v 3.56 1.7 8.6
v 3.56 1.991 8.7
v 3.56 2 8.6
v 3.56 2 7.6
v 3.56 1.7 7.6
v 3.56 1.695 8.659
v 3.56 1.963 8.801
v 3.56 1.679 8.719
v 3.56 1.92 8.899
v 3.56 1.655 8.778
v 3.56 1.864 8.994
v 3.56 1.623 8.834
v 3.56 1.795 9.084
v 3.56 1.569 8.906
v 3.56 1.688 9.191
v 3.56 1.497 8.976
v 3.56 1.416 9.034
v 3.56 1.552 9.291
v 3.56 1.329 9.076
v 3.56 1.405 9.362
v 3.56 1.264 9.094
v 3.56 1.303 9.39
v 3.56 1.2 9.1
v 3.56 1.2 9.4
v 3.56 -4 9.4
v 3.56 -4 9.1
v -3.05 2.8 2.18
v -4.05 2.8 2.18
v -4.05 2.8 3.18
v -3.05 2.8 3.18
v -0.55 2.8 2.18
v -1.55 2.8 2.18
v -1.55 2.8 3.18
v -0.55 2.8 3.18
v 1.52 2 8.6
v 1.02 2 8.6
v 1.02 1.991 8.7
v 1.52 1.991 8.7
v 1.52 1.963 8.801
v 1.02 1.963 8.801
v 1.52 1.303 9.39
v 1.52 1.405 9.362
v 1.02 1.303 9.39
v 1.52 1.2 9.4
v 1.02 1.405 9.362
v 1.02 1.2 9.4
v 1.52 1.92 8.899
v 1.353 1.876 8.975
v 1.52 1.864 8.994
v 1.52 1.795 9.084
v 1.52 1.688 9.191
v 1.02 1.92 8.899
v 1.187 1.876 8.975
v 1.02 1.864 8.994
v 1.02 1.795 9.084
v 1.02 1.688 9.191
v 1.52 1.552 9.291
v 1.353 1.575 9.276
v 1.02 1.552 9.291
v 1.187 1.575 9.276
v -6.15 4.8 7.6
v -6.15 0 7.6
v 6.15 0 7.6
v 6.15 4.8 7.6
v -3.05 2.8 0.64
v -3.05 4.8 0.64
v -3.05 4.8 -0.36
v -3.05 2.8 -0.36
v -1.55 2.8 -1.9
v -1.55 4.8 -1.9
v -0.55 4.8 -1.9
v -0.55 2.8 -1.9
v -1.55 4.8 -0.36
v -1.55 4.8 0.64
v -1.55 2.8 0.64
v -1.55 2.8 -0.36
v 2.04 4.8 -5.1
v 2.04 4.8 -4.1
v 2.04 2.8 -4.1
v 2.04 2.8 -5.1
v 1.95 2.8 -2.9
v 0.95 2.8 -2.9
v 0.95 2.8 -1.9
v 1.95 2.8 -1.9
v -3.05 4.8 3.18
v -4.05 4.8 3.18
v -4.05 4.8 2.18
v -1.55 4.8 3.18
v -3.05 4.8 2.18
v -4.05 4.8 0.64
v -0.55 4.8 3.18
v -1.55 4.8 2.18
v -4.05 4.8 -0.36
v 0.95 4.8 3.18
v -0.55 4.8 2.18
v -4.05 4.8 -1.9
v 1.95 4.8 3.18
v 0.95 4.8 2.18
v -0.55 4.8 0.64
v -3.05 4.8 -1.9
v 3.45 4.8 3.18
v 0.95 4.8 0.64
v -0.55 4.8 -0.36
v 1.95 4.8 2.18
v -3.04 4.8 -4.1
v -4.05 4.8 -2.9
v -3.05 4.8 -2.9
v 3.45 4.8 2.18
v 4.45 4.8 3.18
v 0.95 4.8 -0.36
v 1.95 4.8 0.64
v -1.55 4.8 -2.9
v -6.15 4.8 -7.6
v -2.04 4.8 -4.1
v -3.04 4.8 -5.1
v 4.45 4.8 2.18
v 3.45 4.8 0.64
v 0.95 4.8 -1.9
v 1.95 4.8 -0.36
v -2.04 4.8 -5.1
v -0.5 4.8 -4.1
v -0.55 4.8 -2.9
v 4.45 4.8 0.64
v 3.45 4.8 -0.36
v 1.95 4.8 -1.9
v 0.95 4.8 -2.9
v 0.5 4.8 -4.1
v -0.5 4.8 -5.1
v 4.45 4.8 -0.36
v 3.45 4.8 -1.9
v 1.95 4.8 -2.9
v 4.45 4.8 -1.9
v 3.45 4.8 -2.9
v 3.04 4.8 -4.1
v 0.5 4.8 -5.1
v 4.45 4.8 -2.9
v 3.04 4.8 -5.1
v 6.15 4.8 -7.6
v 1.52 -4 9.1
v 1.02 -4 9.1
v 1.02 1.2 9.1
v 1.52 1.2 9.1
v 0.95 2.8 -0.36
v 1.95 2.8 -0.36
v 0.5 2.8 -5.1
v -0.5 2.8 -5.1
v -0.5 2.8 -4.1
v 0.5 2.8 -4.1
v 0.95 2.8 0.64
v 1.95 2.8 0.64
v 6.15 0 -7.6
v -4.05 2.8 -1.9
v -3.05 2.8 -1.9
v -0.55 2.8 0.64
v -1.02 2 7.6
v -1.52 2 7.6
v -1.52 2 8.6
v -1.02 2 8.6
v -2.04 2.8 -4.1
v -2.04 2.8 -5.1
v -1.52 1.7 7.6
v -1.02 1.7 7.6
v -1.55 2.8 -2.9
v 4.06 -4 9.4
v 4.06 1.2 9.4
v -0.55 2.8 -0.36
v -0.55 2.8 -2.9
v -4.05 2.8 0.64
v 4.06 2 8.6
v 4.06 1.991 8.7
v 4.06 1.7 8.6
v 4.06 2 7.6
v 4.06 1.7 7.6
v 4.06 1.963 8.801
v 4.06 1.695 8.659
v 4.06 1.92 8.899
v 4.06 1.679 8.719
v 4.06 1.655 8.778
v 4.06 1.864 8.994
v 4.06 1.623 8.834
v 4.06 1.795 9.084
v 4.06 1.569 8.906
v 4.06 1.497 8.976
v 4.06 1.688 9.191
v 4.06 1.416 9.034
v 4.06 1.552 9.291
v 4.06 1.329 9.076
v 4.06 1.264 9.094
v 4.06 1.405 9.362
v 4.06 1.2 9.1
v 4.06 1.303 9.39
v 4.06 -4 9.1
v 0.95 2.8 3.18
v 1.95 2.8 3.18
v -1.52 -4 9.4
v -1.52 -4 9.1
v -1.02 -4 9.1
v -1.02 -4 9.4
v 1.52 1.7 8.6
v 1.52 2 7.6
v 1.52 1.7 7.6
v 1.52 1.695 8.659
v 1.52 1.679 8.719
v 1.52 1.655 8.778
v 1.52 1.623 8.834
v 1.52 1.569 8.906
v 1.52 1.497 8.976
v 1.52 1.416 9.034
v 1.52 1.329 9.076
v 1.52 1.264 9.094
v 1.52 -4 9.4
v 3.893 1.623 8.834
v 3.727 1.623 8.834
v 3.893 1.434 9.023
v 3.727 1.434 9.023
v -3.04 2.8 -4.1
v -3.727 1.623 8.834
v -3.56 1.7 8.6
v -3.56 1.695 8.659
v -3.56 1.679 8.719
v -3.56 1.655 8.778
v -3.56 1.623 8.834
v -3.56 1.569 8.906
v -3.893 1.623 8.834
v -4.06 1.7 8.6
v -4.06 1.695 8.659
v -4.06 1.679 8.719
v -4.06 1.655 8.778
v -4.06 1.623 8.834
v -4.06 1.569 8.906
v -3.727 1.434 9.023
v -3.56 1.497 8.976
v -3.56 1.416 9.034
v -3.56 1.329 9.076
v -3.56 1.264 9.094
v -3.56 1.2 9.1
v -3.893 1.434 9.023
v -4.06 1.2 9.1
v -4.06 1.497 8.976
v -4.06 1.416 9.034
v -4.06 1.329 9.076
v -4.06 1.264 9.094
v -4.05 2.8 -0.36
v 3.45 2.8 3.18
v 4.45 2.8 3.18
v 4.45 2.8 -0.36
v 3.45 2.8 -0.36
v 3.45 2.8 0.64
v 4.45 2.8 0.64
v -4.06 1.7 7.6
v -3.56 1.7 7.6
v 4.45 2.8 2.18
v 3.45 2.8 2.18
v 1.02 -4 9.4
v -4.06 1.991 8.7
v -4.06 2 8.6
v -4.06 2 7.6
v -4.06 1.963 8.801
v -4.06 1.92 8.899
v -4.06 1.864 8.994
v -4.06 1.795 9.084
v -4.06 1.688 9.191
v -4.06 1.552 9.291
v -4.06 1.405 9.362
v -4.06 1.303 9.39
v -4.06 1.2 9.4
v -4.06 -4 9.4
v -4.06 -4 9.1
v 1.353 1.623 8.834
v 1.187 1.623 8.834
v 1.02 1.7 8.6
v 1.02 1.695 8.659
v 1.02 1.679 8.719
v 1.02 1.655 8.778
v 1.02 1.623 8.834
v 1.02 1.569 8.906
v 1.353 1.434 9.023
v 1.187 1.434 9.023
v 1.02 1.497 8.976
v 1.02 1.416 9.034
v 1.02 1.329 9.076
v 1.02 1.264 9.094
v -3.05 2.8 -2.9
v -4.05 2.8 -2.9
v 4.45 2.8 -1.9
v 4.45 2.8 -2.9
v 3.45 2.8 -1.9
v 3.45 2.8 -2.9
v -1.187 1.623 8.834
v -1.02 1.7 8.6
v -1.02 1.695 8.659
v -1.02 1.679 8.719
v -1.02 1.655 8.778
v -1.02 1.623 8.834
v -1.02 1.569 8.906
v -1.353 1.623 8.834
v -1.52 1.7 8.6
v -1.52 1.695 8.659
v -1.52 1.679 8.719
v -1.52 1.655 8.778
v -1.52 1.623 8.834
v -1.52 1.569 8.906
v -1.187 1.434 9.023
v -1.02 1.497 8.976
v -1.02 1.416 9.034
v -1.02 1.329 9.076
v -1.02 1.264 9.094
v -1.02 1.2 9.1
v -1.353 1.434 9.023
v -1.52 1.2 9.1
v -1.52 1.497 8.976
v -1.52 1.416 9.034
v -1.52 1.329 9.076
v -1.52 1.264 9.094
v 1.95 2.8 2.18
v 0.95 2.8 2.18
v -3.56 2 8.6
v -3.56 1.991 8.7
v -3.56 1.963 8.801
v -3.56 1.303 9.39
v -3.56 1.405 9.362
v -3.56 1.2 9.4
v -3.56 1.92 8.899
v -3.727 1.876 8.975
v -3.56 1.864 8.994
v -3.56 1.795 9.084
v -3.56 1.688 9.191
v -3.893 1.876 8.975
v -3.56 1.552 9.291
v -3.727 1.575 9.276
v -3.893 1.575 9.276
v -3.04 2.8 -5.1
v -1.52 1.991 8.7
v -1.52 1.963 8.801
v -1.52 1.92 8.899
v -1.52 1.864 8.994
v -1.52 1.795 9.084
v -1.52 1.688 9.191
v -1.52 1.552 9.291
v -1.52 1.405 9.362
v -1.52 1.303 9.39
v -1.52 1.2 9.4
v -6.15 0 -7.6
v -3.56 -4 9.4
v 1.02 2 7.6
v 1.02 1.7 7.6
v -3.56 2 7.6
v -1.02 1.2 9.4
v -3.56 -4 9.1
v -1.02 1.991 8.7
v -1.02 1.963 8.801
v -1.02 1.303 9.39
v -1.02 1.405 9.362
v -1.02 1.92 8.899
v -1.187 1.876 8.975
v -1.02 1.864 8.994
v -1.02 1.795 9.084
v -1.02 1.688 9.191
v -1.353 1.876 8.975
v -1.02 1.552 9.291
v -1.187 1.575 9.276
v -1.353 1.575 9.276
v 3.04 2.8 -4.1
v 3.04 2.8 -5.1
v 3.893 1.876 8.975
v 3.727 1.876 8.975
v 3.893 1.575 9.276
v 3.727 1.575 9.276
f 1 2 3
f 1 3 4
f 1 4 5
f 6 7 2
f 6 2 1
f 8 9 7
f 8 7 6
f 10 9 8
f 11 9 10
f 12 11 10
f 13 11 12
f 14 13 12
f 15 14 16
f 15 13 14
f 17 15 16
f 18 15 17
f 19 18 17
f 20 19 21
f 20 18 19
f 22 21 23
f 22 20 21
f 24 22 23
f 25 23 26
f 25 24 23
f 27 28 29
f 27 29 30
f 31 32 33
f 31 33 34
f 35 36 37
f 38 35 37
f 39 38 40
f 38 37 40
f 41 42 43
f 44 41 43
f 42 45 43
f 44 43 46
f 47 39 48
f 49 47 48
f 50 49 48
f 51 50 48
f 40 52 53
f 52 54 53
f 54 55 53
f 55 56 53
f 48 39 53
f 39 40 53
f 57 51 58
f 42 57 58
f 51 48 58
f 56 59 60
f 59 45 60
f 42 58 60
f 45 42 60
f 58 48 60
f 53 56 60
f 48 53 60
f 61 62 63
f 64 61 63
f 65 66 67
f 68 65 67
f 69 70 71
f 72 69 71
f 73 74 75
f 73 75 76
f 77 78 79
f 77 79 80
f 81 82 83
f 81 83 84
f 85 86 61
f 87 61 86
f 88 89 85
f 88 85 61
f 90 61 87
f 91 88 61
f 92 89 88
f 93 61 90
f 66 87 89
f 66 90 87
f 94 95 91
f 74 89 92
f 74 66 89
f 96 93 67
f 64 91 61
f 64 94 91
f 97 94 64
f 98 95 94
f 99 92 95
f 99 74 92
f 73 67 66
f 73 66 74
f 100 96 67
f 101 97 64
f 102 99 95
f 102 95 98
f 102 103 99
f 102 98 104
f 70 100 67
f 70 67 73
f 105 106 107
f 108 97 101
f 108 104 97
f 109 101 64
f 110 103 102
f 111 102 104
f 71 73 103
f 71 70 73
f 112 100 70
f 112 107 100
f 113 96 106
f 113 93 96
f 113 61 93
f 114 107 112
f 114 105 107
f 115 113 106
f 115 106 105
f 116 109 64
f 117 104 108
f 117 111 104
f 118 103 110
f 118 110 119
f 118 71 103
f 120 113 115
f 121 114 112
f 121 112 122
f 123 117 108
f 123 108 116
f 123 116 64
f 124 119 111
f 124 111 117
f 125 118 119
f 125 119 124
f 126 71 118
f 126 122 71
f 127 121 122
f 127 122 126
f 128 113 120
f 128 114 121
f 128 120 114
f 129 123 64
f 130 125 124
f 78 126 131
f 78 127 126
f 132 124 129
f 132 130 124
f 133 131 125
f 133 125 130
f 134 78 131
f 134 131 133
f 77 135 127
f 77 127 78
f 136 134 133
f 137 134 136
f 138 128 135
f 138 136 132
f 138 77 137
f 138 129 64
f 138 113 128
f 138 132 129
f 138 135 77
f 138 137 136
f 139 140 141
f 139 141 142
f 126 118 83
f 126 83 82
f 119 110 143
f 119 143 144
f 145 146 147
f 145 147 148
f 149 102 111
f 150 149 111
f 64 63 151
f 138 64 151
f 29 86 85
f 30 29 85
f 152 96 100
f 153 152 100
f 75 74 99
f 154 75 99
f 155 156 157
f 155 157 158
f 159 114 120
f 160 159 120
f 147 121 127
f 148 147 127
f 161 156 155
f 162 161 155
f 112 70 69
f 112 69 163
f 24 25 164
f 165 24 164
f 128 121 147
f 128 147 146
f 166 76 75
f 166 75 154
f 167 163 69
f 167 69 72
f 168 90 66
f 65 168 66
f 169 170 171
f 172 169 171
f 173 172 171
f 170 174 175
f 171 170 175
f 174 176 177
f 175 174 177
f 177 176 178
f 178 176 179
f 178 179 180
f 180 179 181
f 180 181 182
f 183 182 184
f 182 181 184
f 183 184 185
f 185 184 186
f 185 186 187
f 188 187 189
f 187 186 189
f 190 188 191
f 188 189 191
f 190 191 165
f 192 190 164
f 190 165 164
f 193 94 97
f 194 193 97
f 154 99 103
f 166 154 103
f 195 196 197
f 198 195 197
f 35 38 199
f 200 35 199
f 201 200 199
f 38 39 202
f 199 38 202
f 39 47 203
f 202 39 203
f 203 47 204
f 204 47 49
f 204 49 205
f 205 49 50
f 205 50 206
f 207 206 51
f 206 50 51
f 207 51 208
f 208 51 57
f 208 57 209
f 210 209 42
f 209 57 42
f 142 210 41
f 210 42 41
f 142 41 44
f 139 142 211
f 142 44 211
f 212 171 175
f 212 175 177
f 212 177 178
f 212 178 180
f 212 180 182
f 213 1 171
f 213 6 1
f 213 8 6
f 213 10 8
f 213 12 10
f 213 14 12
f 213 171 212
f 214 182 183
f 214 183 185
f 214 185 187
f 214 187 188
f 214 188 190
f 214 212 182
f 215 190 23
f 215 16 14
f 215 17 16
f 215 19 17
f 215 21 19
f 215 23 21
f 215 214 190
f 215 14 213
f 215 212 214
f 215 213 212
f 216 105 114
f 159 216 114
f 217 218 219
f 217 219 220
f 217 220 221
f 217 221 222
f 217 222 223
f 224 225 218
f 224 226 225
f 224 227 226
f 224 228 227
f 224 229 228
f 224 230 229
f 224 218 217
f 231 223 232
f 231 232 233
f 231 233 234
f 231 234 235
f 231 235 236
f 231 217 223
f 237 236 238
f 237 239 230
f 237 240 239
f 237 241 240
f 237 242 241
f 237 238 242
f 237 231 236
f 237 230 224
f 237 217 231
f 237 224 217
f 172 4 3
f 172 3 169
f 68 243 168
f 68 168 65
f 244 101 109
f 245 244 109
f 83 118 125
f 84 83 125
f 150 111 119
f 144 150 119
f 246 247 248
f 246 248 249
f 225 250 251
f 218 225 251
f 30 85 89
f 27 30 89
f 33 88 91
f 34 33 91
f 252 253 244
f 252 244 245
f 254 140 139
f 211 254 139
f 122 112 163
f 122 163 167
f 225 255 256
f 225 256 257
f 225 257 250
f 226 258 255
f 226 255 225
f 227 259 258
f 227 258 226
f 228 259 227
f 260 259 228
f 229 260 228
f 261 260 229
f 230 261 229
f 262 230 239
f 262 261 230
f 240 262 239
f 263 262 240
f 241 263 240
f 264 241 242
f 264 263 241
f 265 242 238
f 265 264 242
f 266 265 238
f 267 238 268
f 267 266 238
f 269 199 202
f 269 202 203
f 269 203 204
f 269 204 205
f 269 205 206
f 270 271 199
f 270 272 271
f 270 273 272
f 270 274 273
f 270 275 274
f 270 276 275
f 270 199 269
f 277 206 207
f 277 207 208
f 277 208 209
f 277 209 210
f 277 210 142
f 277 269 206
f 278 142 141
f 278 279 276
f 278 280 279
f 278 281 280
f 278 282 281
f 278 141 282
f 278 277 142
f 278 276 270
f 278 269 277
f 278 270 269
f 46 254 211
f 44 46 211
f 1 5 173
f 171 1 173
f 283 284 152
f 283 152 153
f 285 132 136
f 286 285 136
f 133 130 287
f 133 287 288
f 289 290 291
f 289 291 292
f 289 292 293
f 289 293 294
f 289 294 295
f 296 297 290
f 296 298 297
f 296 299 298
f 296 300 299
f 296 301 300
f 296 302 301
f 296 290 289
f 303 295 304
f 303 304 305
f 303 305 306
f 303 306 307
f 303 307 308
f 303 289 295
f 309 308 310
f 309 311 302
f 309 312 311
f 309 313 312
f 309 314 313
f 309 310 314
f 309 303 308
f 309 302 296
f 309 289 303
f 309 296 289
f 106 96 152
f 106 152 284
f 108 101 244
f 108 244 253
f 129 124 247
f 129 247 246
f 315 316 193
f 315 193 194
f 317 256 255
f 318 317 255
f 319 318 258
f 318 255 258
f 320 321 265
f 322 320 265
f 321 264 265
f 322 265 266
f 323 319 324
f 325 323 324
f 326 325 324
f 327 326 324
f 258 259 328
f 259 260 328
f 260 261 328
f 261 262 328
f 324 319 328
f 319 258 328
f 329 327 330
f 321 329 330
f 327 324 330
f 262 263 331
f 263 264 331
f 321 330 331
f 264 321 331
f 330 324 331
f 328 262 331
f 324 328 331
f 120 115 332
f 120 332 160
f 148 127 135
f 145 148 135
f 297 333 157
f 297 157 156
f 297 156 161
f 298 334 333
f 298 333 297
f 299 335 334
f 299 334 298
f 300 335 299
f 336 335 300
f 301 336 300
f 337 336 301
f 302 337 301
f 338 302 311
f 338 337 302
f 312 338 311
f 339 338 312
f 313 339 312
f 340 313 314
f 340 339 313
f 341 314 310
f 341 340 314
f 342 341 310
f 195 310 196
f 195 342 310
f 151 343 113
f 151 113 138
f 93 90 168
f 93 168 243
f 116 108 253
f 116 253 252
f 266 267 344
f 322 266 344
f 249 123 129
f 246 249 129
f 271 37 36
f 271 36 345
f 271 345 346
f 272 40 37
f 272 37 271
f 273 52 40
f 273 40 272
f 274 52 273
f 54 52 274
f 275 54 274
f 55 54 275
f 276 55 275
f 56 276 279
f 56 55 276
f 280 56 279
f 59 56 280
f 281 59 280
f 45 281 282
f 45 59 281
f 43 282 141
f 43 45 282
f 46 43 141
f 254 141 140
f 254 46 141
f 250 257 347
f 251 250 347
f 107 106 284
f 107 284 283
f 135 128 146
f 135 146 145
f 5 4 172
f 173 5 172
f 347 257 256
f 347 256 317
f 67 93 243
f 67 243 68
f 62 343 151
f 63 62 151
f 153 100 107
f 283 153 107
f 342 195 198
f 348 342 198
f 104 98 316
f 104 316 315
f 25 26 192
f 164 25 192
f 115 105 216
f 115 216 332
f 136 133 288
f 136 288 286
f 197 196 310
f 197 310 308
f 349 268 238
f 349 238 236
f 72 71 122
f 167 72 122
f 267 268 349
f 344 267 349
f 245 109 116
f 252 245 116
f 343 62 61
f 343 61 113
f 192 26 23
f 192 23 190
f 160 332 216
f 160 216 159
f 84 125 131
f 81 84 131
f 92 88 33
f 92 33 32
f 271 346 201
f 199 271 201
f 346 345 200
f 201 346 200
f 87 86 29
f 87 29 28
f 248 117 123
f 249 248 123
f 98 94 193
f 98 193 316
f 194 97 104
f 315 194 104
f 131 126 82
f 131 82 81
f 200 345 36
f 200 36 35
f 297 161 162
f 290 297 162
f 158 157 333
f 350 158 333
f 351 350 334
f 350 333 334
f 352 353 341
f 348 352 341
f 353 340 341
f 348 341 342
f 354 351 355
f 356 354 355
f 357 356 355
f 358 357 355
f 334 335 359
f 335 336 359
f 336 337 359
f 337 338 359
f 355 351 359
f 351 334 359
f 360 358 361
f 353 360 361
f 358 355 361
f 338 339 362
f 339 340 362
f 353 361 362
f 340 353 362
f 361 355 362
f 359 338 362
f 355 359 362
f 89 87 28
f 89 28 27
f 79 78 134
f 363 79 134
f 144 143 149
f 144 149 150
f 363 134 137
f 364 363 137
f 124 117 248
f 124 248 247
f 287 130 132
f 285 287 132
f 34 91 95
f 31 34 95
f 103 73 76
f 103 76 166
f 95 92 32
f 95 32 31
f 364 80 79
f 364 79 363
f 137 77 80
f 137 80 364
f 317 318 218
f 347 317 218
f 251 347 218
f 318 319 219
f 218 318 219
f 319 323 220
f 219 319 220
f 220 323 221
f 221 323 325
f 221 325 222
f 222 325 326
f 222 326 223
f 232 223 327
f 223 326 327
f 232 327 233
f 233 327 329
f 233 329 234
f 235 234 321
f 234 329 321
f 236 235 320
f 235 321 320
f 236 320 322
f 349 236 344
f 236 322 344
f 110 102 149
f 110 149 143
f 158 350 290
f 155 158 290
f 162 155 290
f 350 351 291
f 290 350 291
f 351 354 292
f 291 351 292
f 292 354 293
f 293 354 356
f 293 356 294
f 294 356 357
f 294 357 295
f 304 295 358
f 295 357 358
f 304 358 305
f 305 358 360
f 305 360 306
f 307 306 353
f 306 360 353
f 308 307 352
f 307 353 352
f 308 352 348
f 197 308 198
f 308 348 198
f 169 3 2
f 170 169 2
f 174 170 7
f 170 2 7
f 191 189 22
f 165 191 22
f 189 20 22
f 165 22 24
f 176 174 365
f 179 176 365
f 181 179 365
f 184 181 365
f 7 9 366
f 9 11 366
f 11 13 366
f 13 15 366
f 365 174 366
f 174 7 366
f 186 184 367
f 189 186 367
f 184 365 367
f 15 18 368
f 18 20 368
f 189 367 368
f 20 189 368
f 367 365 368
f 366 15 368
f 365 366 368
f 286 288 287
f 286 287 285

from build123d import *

# Parameters (mm, degrees)
SKETCH_1_W                  = 12.3
SKETCH_1_H                  = 15.2
EXTRUDE_1_DEPTH             = 4.8
SKETCH_2_W                  = 0.5
SKETCH_2_H                  = 0.3
EXTRUDE_2_DEPTH             = 1
EXTRUDE_3_DEPTH             = 1.2
EXTRUDE_3_DEPTH_BACK        = 4
SKETCH_5_W                  = 0.5
SKETCH_5_H                  = 0.3
LOFT_START                  = 3.56
LOFT_1_DEPTH                = 0.5
PATTERN_LINEAR_1_COUNT      = 4
PATTERN_LINEAR_1_PITCH      = 2.54
SKETCH_3_W                  = 1
SKETCH_3_H                  = 1
CUT_EXTRUDE_1_DEPTH         = 2
PATTERN_LINEAR_2_COUNT      = 2
PATTERN_LINEAR_2_PITCH      = 2.54
PATTERN_LINEAR_2_COL_COUNT  = 2
PATTERN_LINEAR_2_COL_PITCH  = 2.54
SKETCH_4_W                  = 1
SKETCH_4_H                  = 1
CUT_EXTRUDE_2_DEPTH         = 2
PATTERN_LINEAR_3_COUNT      = 4
PATTERN_LINEAR_3_PITCH      = 2.5
PATTERN_LINEAR_3_COUNT_DIR2 = 3
PATTERN_LINEAR_3_PITCH_DIR2 = 2.54


# Read off the part's stored shape, not the designer's step: По сечениям1
with BuildPart() as part:
    # Эскиз1 → Бобышка-Вытянуть1 (new body)
    with BuildSketch(Plane(origin=(0, 0, 0), x_dir=(1, 0, 0), z_dir=(0, 1, 0))):
        Rectangle(SKETCH_1_W, SKETCH_1_H)
    extrude(amount=EXTRUDE_1_DEPTH)

    # Эскиз3 → Вырез-Вытянуть1 (cut)
    with BuildSketch(Plane(origin=(0, 4.8, 0), x_dir=(1, 0, 0), z_dir=(0, 1, 0))):
        with Locations((0, 4.6)):
            Rectangle(SKETCH_3_W, SKETCH_3_H)
    cut_extrude_1 = extrude(amount=-CUT_EXTRUDE_1_DEPTH, mode=Mode.SUBTRACT)

    # Линейный массив2: Вырез-Вытянуть1 ×2
    with Locations(*[(i * PATTERN_LINEAR_2_PITCH, 0, 0) for i in range(1, PATTERN_LINEAR_2_COUNT)]):
        add(cut_extrude_1, mode=Mode.SUBTRACT)

    # Линейный массив2 col: Вырез-Вытянуть1 ×2
    with Locations(*[(-i * PATTERN_LINEAR_2_COL_PITCH, 0, 0) for i in range(1, PATTERN_LINEAR_2_COL_COUNT)]):
        add(cut_extrude_1, mode=Mode.SUBTRACT)

    # Эскиз4 → Вырез-Вытянуть2 (cut)
    with BuildSketch(Plane(origin=(0, 4.8, 0), x_dir=(1, 0, 0), z_dir=(0, 1, 0))):
        with Locations((3.95, 2.4)):
            Rectangle(SKETCH_4_W, SKETCH_4_H)
    cut_extrude_2 = extrude(amount=-CUT_EXTRUDE_2_DEPTH, mode=Mode.SUBTRACT)

    # Линейный массив3: Cut-Extrude 2 4 × 3
    with Locations(*[(-i * PATTERN_LINEAR_3_PITCH, 0, j * PATTERN_LINEAR_3_PITCH_DIR2) for i in range(PATTERN_LINEAR_3_COUNT) for j in range(PATTERN_LINEAR_3_COUNT_DIR2) if (i, j) != (0, 0)]):
        add(cut_extrude_2, mode=Mode.SUBTRACT)


with BuildPart() as body_2:
    # Эскиз2 → Бобышка-Вытянуть2 (new body)
    with BuildSketch(Plane.XY.offset(7.6)):
        with Locations((3.81, 1.85)):
            Rectangle(SKETCH_2_W, SKETCH_2_H)
    extrude(amount=EXTRUDE_2_DEPTH)



with BuildPart() as body_3:
    # Эскиз5 → Бобышка-Вытянуть3 (new, two sides: drawn at the far end of the back side and taken through both)
    with BuildSketch(Plane(origin=(0, 0, 0), x_dir=(1, 0, 0), z_dir=(0, 1, 0)).offset(-EXTRUDE_3_DEPTH_BACK)):
        with Locations((3.81, -9.25)):
            Rectangle(SKETCH_5_W, SKETCH_5_H)
    extrude(amount=EXTRUDE_3_DEPTH + EXTRUDE_3_DEPTH_BACK)


with BuildPart() as body_2_1:
    add(body_2.part)

    add(body_3.part)  # По сечениям1 merges body 3
    # По сечениям1 outline → По сечениям1 (add)
    with BuildSketch(Plane.YZ.offset(LOFT_START)):
        with BuildLine():
            add(Edge.make_bspline(
                [(1.7, 8.6), (1.7, 8.83570226), (1.43570226, 9.1), (1.2, 9.1)],
                knots=[0, 0, 0, 0, 1, 1, 1, 1], degree=3))
            Line((1.7, 8.6), (2, 8.6))
            add(Edge.make_bspline(
                [(2, 8.6), (2, 8.977123617), (1.577123617, 9.4), (1.2, 9.4)],
                knots=[0, 0, 0, 0, 1, 1, 1, 1], degree=3))
            Line((1.2, 9.4), (1.2, 9.1))
        make_face()
    extrude(amount=LOFT_1_DEPTH)


with BuildPart() as pattern_linear_1_1:
    # Линейный массив1: pattern copy
    add(body_2_1.part.moved(Location(Vector(-1, 0, 0) * (1 * PATTERN_LINEAR_1_PITCH))))


with BuildPart() as pattern_linear_1_2:
    # Линейный массив1: pattern copy
    add(body_2_1.part.moved(Location(Vector(-1, 0, 0) * (2 * PATTERN_LINEAR_1_PITCH))))


with BuildPart() as pattern_linear_1_3:
    # Линейный массив1: pattern copy
    add(body_2_1.part.moved(Location(Vector(-1, 0, 0) * (3 * PATTERN_LINEAR_1_PITCH))))


solid = Compound([part.part, body_2_1.part, pattern_linear_1_1.part, pattern_linear_1_2.part, pattern_linear_1_3.part])
